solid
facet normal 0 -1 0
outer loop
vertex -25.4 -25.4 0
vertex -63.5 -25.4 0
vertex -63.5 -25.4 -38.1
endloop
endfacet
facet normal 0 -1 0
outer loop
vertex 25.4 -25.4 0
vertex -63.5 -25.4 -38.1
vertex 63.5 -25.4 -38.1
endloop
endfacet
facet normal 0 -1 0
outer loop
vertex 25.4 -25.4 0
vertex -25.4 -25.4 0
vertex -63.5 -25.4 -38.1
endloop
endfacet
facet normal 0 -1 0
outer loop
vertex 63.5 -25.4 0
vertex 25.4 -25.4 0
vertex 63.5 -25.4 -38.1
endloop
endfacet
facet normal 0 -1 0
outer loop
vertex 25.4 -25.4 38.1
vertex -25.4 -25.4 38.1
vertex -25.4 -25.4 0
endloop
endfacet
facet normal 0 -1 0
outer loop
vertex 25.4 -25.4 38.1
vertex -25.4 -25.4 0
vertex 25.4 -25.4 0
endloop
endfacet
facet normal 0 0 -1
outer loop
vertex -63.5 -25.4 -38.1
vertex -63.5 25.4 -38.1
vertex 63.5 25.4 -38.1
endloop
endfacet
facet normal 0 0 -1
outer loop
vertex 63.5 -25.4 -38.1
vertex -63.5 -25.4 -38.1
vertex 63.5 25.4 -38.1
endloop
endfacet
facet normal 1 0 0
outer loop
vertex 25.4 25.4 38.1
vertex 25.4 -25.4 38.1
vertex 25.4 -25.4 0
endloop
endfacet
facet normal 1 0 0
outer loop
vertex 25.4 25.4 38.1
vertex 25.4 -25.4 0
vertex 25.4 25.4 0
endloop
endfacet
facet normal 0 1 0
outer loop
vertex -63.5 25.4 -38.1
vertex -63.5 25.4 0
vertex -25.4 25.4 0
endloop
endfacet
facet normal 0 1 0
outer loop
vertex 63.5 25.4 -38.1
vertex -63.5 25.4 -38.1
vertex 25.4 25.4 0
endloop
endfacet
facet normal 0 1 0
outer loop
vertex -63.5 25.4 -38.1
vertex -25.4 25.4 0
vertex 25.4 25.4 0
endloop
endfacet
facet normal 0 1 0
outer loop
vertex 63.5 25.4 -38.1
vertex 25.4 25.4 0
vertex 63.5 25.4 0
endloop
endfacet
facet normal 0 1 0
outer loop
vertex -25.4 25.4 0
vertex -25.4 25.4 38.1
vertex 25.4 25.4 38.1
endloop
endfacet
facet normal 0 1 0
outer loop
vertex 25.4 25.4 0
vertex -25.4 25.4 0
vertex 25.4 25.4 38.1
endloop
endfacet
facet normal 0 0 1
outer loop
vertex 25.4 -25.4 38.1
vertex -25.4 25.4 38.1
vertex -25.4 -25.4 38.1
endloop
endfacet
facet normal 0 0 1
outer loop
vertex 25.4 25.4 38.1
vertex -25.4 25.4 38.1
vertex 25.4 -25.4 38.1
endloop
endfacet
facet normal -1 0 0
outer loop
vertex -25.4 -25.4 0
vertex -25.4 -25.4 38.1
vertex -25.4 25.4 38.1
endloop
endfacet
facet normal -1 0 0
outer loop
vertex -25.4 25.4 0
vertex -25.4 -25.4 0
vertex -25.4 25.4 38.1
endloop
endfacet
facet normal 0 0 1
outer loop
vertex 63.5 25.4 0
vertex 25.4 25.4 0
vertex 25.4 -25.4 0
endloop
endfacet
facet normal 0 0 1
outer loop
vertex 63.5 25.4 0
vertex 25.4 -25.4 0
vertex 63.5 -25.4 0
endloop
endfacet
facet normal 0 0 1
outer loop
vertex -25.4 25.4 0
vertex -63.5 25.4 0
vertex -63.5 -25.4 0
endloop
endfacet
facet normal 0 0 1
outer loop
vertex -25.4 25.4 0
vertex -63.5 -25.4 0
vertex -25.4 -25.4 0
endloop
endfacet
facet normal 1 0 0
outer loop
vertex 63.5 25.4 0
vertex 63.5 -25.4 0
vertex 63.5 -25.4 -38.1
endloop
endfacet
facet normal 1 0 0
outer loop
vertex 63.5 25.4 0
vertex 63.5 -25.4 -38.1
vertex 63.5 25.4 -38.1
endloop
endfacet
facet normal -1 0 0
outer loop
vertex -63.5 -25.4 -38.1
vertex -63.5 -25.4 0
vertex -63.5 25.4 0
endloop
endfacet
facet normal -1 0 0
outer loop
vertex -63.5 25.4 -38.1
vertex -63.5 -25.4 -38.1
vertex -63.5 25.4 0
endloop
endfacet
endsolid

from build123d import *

# Parameters (mm, degrees)
F0_W     = 127
F0_H     = 50.8
F1_DEPTH = 38.1
F2_W     = 38.1
F2_H     = 50.8
F3_DEPTH = 25.4
F4_DEPTH = 38.1


with BuildPart() as f1:
    # F0 (on Top) → F1 (new body, symmetric)
    with BuildSketch(Plane.XY):
        Rectangle(F0_W, F0_H)
    extrude(amount=F1_DEPTH, both=True)

    # F2 (on face) → F3 (cut)
    with BuildSketch(Plane.XY.offset(38.1)):
        with Locations((-44.45, 0)):
            Rectangle(F2_W, F2_H)
        with Locations((44.45, 0)):
            Rectangle(F2_W, F2_H)
    extrude(amount=-F3_DEPTH, mode=Mode.SUBTRACT)

    # F2 (on face) → F4 (cut)
    with BuildSketch(Plane.XY.offset(38.1)):
        with Locations((-44.45, 0)):
            Rectangle(F2_W, F2_H)
        with Locations((44.45, 0)):
            Rectangle(F2_W, F2_H)
    extrude(amount=-F4_DEPTH, mode=Mode.SUBTRACT)


solid = f1.part
